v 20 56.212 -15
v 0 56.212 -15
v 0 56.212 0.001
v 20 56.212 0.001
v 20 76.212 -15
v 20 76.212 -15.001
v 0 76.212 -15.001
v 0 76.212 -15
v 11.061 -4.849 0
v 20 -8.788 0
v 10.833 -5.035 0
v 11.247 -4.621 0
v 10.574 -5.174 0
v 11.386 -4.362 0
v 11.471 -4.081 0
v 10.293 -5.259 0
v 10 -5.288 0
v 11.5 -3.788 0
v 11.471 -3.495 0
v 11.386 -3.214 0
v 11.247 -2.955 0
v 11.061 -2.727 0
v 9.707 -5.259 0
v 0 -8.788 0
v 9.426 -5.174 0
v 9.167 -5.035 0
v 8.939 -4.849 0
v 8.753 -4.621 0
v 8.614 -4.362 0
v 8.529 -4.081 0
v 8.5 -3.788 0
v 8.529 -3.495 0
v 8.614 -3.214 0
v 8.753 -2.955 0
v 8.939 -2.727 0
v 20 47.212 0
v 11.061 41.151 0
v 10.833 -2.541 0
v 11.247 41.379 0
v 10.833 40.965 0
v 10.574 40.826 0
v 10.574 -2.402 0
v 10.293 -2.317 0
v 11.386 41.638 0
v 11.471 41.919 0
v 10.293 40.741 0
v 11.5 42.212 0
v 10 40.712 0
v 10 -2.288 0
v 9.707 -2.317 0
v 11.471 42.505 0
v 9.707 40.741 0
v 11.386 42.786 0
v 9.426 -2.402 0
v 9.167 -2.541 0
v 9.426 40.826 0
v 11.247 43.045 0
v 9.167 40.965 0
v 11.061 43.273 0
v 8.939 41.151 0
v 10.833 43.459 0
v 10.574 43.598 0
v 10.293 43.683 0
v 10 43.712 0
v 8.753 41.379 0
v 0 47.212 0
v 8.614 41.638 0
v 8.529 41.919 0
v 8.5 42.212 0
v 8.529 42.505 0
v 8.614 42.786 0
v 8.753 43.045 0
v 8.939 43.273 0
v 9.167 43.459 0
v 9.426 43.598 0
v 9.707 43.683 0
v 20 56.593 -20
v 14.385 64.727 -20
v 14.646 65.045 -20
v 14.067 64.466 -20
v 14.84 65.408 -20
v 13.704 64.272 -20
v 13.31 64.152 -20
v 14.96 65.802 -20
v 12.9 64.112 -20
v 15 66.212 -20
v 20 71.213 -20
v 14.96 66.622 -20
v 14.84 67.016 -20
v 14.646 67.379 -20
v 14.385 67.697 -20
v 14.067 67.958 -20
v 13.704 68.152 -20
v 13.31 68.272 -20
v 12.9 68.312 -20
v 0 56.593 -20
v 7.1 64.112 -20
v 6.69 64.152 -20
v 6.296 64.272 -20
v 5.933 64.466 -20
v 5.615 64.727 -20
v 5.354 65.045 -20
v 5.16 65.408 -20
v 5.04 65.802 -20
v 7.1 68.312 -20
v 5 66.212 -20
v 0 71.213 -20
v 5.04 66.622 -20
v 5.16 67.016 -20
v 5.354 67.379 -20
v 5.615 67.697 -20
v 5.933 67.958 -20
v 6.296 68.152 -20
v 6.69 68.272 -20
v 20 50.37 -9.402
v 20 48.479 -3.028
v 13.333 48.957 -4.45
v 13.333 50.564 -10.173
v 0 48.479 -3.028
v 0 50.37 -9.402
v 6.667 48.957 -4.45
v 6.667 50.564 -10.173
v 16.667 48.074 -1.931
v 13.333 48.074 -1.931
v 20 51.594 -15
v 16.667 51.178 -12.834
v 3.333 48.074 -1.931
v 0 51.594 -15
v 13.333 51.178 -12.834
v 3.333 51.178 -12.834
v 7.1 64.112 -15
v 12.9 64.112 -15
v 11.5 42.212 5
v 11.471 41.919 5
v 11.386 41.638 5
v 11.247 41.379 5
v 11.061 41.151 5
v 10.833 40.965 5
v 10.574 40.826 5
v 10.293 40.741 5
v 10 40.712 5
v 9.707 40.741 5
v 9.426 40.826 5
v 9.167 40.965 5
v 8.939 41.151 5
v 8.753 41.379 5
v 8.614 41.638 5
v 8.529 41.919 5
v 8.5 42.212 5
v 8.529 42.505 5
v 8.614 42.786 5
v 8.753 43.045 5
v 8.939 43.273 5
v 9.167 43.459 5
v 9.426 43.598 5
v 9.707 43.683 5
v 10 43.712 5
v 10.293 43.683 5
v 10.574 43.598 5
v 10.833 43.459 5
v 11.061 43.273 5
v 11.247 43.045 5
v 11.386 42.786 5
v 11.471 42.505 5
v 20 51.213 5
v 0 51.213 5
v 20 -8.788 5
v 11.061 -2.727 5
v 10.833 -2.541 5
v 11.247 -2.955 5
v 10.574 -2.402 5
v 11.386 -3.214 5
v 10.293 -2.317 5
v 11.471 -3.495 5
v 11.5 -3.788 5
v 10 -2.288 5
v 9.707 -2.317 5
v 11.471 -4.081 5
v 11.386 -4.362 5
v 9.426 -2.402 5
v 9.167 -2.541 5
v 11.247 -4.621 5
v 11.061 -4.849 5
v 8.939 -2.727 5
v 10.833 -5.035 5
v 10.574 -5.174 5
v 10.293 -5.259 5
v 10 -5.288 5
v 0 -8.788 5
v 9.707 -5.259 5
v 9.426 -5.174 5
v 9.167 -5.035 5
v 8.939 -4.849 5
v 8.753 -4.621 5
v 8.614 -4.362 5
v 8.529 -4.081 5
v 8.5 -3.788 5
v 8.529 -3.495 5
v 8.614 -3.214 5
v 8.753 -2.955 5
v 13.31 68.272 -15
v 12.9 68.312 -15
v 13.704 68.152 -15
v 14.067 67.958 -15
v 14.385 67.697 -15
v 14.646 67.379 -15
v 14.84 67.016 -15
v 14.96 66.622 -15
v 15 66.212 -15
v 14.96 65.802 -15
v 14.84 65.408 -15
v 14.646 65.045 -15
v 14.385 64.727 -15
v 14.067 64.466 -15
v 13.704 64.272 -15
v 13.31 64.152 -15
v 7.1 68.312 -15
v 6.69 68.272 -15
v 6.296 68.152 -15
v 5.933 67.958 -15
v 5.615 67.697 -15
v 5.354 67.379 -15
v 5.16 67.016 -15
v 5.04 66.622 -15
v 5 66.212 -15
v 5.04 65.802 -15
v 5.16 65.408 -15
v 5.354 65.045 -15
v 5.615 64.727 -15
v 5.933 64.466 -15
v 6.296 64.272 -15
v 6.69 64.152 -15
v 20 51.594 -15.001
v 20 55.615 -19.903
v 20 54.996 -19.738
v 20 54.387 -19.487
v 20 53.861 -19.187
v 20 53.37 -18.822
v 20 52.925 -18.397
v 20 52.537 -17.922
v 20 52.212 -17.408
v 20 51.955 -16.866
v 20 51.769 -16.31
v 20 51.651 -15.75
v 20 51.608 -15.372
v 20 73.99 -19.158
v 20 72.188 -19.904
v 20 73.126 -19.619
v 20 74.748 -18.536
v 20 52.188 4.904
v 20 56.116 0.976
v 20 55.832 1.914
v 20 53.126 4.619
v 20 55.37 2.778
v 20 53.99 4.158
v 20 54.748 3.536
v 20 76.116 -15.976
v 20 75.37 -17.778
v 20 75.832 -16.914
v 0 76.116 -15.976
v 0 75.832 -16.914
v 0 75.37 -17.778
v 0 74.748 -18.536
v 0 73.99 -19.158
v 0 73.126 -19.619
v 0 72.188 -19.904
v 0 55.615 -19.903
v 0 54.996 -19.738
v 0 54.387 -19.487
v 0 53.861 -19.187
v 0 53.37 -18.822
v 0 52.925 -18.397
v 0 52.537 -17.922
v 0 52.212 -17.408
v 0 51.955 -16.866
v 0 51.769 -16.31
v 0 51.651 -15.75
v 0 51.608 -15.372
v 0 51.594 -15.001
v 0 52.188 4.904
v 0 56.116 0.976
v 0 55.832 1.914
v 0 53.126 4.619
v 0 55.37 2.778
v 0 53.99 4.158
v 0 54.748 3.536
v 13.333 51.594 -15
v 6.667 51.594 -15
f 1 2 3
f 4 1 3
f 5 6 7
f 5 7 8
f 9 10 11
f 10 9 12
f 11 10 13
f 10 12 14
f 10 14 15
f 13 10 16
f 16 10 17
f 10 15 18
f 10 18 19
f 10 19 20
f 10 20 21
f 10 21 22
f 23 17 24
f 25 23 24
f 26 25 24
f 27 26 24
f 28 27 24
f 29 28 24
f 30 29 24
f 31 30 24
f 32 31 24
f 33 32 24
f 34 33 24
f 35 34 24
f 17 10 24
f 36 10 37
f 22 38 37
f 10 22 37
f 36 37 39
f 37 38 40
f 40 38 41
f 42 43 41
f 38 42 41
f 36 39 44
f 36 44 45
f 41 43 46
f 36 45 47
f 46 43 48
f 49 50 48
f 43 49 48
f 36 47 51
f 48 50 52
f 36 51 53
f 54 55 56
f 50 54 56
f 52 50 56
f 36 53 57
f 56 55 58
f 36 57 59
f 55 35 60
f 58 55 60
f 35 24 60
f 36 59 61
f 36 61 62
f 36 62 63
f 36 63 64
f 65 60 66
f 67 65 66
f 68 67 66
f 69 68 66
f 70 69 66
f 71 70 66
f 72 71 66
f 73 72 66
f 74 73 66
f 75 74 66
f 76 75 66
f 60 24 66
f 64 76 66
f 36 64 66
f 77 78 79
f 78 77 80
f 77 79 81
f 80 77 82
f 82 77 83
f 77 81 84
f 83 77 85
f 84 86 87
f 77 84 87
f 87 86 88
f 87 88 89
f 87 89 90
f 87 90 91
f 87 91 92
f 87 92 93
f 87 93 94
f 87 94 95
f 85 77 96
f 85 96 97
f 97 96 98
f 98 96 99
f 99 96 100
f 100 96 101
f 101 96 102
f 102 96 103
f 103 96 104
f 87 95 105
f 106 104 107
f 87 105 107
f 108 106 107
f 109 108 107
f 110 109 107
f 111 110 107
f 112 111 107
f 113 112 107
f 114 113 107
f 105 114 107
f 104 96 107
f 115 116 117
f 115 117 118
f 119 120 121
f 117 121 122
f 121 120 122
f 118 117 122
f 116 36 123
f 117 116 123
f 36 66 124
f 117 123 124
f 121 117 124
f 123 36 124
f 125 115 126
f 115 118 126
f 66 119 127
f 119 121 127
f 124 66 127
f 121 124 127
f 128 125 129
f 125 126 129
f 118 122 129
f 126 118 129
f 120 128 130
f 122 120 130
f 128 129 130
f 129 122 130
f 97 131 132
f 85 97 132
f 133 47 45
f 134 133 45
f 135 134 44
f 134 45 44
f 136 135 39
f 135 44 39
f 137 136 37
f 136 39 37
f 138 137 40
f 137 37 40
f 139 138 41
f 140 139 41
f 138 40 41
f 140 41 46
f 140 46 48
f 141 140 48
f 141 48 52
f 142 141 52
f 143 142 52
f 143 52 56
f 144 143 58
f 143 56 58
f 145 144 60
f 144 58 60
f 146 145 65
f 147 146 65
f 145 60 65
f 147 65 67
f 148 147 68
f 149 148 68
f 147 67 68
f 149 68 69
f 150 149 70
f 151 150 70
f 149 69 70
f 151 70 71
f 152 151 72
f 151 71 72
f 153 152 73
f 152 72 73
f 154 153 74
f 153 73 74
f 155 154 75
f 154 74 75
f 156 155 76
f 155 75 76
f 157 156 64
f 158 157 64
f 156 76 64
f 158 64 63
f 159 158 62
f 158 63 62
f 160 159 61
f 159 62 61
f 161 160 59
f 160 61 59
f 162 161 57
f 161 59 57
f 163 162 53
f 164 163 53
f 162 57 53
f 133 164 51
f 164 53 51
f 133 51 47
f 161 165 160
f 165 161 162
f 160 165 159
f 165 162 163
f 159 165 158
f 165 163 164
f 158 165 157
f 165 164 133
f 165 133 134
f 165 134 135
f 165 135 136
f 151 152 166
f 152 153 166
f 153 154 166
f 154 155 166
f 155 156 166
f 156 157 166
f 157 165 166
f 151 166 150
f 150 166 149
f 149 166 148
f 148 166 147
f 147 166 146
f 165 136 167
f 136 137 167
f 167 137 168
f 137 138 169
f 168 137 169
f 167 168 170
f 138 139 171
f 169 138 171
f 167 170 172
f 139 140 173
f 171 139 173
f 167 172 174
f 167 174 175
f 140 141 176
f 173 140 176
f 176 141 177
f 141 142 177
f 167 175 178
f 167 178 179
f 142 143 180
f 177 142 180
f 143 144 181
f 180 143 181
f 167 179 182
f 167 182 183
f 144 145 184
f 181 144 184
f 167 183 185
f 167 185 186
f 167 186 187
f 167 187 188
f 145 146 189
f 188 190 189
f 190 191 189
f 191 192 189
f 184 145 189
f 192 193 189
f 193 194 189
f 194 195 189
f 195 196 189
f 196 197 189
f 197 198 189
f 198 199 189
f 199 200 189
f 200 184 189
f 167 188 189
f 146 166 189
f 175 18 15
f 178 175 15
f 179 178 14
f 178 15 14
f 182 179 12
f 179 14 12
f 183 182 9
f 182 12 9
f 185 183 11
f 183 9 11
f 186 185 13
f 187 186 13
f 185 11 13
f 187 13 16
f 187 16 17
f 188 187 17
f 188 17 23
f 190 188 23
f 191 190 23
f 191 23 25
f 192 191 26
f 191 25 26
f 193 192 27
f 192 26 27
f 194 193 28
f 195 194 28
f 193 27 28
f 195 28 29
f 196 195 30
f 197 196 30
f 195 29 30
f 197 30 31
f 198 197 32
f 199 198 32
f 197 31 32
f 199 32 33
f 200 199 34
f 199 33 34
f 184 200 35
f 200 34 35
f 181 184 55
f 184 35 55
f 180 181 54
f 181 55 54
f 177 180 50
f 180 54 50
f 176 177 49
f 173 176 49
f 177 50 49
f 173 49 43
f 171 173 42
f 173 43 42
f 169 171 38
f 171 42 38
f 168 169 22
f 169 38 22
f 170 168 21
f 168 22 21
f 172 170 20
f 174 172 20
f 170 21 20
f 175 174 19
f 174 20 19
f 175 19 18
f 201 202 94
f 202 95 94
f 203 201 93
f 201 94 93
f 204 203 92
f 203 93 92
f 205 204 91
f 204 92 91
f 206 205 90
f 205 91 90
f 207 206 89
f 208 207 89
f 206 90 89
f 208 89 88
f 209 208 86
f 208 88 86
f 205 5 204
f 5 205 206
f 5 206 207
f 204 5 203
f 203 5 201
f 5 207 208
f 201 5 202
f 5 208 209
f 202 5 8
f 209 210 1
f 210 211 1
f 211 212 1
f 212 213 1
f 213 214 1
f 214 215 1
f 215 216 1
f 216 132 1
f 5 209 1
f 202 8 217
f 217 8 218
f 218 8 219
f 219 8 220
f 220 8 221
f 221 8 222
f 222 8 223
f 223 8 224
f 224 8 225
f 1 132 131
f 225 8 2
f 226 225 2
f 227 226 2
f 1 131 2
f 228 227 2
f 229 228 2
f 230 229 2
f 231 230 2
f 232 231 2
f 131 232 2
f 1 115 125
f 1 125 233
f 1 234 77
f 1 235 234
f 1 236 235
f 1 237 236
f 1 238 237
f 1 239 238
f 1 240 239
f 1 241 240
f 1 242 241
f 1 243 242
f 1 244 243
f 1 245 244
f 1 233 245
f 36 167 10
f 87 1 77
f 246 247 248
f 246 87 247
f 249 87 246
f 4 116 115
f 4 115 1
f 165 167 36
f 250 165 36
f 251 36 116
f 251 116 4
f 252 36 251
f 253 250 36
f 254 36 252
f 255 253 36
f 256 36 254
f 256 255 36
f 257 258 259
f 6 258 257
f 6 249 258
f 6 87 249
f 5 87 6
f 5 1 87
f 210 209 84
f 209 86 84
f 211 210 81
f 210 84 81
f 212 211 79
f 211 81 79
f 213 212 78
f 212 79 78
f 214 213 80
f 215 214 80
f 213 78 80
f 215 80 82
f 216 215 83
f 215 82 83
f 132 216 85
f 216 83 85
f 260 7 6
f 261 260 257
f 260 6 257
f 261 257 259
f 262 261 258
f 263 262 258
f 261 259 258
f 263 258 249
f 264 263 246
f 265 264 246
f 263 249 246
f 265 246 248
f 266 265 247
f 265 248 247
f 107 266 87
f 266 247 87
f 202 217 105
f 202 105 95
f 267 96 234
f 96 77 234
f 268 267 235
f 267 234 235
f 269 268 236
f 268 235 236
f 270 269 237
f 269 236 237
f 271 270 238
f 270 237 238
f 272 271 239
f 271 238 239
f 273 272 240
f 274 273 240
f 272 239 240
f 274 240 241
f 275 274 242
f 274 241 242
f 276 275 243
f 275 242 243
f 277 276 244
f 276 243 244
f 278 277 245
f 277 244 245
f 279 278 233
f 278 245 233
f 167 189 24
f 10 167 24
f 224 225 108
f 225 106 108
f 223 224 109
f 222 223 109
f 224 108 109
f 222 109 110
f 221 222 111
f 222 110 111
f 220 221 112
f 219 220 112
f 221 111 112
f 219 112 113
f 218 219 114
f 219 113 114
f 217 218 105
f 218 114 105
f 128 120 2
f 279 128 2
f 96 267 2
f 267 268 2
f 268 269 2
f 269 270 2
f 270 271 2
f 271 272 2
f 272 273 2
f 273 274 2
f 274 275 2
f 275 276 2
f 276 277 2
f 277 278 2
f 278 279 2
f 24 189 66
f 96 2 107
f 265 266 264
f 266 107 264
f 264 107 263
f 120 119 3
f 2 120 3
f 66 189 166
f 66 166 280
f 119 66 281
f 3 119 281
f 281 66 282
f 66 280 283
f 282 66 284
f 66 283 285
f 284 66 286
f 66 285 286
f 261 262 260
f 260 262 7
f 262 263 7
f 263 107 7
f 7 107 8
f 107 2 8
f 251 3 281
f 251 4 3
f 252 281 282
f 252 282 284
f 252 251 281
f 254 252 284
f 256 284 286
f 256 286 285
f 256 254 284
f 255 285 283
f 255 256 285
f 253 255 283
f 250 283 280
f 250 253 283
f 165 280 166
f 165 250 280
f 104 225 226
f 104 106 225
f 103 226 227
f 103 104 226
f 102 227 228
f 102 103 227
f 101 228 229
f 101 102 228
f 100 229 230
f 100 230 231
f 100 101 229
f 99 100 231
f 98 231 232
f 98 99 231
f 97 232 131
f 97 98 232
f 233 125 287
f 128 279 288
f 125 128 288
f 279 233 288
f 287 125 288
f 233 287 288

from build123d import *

# Parameters (mm, degrees)
F1_DEPTH = 20
F2_R     = 1.5
F3_DEPTH = 5
F4_W     = 10
F4_H     = 4.2
F5_DEPTH = 5
F6_R     = 2.09999
F7_R     = 4.999


# Not quite as in the source:
# - a fillet or chamfer is up to 0.001 mm smaller than in the source, because OpenCascade refuses the exact size


with BuildPart() as f1:
    # F0 (on Right) → F1 (new body)
    with BuildSketch(Plane.YZ):
        with BuildLine():
            Line((76.2121204979, -15), (56.2121204979, -15))
            Line((56.2121204979, -15), (51.5942049014, -15))
            add(Edge.make_bspline(
                [(51.5942049014, -15), (51.5942049014, -16.6666666667), (51.5942043035, -18.3333333333), (51.5942049014, -20)],
                knots=[0, 0, 0, 0, 5, 5, 5, 5], degree=3))
            Line((51.5942049014, -20), (76.2121204979, -20))
            Line((76.2121204979, -20), (76.2121204979, -15))
        make_face()
        with BuildLine():
            Line((56.2121204979, -15), (56.2121204979, 0))
            Line((56.2121204979, 0), (47.2121204979, 0))
            add(Edge.make_bspline(
                [(47.2121204979, 0), (48.878788136, -3.0912153851), (50.9981620768, -11.3440190259), (51.5942049014, -15)],
                knots=[0, 0, 0, 0, 15.6269851129, 15.6269851129, 15.6269851129, 15.6269851129], degree=3))
            Line((51.5942049014, -15), (56.2121204979, -15))
        make_face()
        Polygon((56.2121204979, 0), (56.2121204979, 5), (-8.7878795021, 5), (-8.7878795021, 0), (47.2121204979, 0), align=None)
    extrude(amount=F1_DEPTH)

    # F2 (on face) → F3 (cut)
    with BuildSketch(Plane(origin=(0, 0, 0), x_dir=(1, 0, 0), z_dir=(0, 0, -1))):
        with Locations((10, -42.2121204979)):
            Circle(F2_R)
        with Locations((10, 3.7878795021)):
            Circle(F2_R)
    extrude(amount=-F3_DEPTH, mode=Mode.SUBTRACT)

    # F4 (on face) → F5 (cut)
    with BuildSketch(Plane.XY.offset(-15)):
        with Locations((10, 66.2121204979)):
            Rectangle(F4_W, F4_H)
    extrude(amount=-F5_DEPTH, mode=Mode.SUBTRACT)

    # F6 (radius 2.1 in the source; OpenCascade refuses exactly that, so slightly less here)
    f6_edges = [f1.edges().sort_by_distance(p)[0] for p in [
        (5, 68.31212, -17.5),
        (15, 68.31212, -17.5),
        (15, 64.11212, -17.5),
        (5, 64.11212, -17.5),
    ]]
    fillet(f6_edges, radius=F6_R)

    # F7 (radius 5 in the source; OpenCascade refuses exactly that, so slightly less here)
    f7_edges = [f1.edges().sort_by_distance(p)[0] for p in [
        (10, 56.21212, 5),
        (10, 76.21212, -20),
        (10, 51.594205, -20),
    ]]
    fillet(f7_edges, radius=F7_R)


solid = f1.part
